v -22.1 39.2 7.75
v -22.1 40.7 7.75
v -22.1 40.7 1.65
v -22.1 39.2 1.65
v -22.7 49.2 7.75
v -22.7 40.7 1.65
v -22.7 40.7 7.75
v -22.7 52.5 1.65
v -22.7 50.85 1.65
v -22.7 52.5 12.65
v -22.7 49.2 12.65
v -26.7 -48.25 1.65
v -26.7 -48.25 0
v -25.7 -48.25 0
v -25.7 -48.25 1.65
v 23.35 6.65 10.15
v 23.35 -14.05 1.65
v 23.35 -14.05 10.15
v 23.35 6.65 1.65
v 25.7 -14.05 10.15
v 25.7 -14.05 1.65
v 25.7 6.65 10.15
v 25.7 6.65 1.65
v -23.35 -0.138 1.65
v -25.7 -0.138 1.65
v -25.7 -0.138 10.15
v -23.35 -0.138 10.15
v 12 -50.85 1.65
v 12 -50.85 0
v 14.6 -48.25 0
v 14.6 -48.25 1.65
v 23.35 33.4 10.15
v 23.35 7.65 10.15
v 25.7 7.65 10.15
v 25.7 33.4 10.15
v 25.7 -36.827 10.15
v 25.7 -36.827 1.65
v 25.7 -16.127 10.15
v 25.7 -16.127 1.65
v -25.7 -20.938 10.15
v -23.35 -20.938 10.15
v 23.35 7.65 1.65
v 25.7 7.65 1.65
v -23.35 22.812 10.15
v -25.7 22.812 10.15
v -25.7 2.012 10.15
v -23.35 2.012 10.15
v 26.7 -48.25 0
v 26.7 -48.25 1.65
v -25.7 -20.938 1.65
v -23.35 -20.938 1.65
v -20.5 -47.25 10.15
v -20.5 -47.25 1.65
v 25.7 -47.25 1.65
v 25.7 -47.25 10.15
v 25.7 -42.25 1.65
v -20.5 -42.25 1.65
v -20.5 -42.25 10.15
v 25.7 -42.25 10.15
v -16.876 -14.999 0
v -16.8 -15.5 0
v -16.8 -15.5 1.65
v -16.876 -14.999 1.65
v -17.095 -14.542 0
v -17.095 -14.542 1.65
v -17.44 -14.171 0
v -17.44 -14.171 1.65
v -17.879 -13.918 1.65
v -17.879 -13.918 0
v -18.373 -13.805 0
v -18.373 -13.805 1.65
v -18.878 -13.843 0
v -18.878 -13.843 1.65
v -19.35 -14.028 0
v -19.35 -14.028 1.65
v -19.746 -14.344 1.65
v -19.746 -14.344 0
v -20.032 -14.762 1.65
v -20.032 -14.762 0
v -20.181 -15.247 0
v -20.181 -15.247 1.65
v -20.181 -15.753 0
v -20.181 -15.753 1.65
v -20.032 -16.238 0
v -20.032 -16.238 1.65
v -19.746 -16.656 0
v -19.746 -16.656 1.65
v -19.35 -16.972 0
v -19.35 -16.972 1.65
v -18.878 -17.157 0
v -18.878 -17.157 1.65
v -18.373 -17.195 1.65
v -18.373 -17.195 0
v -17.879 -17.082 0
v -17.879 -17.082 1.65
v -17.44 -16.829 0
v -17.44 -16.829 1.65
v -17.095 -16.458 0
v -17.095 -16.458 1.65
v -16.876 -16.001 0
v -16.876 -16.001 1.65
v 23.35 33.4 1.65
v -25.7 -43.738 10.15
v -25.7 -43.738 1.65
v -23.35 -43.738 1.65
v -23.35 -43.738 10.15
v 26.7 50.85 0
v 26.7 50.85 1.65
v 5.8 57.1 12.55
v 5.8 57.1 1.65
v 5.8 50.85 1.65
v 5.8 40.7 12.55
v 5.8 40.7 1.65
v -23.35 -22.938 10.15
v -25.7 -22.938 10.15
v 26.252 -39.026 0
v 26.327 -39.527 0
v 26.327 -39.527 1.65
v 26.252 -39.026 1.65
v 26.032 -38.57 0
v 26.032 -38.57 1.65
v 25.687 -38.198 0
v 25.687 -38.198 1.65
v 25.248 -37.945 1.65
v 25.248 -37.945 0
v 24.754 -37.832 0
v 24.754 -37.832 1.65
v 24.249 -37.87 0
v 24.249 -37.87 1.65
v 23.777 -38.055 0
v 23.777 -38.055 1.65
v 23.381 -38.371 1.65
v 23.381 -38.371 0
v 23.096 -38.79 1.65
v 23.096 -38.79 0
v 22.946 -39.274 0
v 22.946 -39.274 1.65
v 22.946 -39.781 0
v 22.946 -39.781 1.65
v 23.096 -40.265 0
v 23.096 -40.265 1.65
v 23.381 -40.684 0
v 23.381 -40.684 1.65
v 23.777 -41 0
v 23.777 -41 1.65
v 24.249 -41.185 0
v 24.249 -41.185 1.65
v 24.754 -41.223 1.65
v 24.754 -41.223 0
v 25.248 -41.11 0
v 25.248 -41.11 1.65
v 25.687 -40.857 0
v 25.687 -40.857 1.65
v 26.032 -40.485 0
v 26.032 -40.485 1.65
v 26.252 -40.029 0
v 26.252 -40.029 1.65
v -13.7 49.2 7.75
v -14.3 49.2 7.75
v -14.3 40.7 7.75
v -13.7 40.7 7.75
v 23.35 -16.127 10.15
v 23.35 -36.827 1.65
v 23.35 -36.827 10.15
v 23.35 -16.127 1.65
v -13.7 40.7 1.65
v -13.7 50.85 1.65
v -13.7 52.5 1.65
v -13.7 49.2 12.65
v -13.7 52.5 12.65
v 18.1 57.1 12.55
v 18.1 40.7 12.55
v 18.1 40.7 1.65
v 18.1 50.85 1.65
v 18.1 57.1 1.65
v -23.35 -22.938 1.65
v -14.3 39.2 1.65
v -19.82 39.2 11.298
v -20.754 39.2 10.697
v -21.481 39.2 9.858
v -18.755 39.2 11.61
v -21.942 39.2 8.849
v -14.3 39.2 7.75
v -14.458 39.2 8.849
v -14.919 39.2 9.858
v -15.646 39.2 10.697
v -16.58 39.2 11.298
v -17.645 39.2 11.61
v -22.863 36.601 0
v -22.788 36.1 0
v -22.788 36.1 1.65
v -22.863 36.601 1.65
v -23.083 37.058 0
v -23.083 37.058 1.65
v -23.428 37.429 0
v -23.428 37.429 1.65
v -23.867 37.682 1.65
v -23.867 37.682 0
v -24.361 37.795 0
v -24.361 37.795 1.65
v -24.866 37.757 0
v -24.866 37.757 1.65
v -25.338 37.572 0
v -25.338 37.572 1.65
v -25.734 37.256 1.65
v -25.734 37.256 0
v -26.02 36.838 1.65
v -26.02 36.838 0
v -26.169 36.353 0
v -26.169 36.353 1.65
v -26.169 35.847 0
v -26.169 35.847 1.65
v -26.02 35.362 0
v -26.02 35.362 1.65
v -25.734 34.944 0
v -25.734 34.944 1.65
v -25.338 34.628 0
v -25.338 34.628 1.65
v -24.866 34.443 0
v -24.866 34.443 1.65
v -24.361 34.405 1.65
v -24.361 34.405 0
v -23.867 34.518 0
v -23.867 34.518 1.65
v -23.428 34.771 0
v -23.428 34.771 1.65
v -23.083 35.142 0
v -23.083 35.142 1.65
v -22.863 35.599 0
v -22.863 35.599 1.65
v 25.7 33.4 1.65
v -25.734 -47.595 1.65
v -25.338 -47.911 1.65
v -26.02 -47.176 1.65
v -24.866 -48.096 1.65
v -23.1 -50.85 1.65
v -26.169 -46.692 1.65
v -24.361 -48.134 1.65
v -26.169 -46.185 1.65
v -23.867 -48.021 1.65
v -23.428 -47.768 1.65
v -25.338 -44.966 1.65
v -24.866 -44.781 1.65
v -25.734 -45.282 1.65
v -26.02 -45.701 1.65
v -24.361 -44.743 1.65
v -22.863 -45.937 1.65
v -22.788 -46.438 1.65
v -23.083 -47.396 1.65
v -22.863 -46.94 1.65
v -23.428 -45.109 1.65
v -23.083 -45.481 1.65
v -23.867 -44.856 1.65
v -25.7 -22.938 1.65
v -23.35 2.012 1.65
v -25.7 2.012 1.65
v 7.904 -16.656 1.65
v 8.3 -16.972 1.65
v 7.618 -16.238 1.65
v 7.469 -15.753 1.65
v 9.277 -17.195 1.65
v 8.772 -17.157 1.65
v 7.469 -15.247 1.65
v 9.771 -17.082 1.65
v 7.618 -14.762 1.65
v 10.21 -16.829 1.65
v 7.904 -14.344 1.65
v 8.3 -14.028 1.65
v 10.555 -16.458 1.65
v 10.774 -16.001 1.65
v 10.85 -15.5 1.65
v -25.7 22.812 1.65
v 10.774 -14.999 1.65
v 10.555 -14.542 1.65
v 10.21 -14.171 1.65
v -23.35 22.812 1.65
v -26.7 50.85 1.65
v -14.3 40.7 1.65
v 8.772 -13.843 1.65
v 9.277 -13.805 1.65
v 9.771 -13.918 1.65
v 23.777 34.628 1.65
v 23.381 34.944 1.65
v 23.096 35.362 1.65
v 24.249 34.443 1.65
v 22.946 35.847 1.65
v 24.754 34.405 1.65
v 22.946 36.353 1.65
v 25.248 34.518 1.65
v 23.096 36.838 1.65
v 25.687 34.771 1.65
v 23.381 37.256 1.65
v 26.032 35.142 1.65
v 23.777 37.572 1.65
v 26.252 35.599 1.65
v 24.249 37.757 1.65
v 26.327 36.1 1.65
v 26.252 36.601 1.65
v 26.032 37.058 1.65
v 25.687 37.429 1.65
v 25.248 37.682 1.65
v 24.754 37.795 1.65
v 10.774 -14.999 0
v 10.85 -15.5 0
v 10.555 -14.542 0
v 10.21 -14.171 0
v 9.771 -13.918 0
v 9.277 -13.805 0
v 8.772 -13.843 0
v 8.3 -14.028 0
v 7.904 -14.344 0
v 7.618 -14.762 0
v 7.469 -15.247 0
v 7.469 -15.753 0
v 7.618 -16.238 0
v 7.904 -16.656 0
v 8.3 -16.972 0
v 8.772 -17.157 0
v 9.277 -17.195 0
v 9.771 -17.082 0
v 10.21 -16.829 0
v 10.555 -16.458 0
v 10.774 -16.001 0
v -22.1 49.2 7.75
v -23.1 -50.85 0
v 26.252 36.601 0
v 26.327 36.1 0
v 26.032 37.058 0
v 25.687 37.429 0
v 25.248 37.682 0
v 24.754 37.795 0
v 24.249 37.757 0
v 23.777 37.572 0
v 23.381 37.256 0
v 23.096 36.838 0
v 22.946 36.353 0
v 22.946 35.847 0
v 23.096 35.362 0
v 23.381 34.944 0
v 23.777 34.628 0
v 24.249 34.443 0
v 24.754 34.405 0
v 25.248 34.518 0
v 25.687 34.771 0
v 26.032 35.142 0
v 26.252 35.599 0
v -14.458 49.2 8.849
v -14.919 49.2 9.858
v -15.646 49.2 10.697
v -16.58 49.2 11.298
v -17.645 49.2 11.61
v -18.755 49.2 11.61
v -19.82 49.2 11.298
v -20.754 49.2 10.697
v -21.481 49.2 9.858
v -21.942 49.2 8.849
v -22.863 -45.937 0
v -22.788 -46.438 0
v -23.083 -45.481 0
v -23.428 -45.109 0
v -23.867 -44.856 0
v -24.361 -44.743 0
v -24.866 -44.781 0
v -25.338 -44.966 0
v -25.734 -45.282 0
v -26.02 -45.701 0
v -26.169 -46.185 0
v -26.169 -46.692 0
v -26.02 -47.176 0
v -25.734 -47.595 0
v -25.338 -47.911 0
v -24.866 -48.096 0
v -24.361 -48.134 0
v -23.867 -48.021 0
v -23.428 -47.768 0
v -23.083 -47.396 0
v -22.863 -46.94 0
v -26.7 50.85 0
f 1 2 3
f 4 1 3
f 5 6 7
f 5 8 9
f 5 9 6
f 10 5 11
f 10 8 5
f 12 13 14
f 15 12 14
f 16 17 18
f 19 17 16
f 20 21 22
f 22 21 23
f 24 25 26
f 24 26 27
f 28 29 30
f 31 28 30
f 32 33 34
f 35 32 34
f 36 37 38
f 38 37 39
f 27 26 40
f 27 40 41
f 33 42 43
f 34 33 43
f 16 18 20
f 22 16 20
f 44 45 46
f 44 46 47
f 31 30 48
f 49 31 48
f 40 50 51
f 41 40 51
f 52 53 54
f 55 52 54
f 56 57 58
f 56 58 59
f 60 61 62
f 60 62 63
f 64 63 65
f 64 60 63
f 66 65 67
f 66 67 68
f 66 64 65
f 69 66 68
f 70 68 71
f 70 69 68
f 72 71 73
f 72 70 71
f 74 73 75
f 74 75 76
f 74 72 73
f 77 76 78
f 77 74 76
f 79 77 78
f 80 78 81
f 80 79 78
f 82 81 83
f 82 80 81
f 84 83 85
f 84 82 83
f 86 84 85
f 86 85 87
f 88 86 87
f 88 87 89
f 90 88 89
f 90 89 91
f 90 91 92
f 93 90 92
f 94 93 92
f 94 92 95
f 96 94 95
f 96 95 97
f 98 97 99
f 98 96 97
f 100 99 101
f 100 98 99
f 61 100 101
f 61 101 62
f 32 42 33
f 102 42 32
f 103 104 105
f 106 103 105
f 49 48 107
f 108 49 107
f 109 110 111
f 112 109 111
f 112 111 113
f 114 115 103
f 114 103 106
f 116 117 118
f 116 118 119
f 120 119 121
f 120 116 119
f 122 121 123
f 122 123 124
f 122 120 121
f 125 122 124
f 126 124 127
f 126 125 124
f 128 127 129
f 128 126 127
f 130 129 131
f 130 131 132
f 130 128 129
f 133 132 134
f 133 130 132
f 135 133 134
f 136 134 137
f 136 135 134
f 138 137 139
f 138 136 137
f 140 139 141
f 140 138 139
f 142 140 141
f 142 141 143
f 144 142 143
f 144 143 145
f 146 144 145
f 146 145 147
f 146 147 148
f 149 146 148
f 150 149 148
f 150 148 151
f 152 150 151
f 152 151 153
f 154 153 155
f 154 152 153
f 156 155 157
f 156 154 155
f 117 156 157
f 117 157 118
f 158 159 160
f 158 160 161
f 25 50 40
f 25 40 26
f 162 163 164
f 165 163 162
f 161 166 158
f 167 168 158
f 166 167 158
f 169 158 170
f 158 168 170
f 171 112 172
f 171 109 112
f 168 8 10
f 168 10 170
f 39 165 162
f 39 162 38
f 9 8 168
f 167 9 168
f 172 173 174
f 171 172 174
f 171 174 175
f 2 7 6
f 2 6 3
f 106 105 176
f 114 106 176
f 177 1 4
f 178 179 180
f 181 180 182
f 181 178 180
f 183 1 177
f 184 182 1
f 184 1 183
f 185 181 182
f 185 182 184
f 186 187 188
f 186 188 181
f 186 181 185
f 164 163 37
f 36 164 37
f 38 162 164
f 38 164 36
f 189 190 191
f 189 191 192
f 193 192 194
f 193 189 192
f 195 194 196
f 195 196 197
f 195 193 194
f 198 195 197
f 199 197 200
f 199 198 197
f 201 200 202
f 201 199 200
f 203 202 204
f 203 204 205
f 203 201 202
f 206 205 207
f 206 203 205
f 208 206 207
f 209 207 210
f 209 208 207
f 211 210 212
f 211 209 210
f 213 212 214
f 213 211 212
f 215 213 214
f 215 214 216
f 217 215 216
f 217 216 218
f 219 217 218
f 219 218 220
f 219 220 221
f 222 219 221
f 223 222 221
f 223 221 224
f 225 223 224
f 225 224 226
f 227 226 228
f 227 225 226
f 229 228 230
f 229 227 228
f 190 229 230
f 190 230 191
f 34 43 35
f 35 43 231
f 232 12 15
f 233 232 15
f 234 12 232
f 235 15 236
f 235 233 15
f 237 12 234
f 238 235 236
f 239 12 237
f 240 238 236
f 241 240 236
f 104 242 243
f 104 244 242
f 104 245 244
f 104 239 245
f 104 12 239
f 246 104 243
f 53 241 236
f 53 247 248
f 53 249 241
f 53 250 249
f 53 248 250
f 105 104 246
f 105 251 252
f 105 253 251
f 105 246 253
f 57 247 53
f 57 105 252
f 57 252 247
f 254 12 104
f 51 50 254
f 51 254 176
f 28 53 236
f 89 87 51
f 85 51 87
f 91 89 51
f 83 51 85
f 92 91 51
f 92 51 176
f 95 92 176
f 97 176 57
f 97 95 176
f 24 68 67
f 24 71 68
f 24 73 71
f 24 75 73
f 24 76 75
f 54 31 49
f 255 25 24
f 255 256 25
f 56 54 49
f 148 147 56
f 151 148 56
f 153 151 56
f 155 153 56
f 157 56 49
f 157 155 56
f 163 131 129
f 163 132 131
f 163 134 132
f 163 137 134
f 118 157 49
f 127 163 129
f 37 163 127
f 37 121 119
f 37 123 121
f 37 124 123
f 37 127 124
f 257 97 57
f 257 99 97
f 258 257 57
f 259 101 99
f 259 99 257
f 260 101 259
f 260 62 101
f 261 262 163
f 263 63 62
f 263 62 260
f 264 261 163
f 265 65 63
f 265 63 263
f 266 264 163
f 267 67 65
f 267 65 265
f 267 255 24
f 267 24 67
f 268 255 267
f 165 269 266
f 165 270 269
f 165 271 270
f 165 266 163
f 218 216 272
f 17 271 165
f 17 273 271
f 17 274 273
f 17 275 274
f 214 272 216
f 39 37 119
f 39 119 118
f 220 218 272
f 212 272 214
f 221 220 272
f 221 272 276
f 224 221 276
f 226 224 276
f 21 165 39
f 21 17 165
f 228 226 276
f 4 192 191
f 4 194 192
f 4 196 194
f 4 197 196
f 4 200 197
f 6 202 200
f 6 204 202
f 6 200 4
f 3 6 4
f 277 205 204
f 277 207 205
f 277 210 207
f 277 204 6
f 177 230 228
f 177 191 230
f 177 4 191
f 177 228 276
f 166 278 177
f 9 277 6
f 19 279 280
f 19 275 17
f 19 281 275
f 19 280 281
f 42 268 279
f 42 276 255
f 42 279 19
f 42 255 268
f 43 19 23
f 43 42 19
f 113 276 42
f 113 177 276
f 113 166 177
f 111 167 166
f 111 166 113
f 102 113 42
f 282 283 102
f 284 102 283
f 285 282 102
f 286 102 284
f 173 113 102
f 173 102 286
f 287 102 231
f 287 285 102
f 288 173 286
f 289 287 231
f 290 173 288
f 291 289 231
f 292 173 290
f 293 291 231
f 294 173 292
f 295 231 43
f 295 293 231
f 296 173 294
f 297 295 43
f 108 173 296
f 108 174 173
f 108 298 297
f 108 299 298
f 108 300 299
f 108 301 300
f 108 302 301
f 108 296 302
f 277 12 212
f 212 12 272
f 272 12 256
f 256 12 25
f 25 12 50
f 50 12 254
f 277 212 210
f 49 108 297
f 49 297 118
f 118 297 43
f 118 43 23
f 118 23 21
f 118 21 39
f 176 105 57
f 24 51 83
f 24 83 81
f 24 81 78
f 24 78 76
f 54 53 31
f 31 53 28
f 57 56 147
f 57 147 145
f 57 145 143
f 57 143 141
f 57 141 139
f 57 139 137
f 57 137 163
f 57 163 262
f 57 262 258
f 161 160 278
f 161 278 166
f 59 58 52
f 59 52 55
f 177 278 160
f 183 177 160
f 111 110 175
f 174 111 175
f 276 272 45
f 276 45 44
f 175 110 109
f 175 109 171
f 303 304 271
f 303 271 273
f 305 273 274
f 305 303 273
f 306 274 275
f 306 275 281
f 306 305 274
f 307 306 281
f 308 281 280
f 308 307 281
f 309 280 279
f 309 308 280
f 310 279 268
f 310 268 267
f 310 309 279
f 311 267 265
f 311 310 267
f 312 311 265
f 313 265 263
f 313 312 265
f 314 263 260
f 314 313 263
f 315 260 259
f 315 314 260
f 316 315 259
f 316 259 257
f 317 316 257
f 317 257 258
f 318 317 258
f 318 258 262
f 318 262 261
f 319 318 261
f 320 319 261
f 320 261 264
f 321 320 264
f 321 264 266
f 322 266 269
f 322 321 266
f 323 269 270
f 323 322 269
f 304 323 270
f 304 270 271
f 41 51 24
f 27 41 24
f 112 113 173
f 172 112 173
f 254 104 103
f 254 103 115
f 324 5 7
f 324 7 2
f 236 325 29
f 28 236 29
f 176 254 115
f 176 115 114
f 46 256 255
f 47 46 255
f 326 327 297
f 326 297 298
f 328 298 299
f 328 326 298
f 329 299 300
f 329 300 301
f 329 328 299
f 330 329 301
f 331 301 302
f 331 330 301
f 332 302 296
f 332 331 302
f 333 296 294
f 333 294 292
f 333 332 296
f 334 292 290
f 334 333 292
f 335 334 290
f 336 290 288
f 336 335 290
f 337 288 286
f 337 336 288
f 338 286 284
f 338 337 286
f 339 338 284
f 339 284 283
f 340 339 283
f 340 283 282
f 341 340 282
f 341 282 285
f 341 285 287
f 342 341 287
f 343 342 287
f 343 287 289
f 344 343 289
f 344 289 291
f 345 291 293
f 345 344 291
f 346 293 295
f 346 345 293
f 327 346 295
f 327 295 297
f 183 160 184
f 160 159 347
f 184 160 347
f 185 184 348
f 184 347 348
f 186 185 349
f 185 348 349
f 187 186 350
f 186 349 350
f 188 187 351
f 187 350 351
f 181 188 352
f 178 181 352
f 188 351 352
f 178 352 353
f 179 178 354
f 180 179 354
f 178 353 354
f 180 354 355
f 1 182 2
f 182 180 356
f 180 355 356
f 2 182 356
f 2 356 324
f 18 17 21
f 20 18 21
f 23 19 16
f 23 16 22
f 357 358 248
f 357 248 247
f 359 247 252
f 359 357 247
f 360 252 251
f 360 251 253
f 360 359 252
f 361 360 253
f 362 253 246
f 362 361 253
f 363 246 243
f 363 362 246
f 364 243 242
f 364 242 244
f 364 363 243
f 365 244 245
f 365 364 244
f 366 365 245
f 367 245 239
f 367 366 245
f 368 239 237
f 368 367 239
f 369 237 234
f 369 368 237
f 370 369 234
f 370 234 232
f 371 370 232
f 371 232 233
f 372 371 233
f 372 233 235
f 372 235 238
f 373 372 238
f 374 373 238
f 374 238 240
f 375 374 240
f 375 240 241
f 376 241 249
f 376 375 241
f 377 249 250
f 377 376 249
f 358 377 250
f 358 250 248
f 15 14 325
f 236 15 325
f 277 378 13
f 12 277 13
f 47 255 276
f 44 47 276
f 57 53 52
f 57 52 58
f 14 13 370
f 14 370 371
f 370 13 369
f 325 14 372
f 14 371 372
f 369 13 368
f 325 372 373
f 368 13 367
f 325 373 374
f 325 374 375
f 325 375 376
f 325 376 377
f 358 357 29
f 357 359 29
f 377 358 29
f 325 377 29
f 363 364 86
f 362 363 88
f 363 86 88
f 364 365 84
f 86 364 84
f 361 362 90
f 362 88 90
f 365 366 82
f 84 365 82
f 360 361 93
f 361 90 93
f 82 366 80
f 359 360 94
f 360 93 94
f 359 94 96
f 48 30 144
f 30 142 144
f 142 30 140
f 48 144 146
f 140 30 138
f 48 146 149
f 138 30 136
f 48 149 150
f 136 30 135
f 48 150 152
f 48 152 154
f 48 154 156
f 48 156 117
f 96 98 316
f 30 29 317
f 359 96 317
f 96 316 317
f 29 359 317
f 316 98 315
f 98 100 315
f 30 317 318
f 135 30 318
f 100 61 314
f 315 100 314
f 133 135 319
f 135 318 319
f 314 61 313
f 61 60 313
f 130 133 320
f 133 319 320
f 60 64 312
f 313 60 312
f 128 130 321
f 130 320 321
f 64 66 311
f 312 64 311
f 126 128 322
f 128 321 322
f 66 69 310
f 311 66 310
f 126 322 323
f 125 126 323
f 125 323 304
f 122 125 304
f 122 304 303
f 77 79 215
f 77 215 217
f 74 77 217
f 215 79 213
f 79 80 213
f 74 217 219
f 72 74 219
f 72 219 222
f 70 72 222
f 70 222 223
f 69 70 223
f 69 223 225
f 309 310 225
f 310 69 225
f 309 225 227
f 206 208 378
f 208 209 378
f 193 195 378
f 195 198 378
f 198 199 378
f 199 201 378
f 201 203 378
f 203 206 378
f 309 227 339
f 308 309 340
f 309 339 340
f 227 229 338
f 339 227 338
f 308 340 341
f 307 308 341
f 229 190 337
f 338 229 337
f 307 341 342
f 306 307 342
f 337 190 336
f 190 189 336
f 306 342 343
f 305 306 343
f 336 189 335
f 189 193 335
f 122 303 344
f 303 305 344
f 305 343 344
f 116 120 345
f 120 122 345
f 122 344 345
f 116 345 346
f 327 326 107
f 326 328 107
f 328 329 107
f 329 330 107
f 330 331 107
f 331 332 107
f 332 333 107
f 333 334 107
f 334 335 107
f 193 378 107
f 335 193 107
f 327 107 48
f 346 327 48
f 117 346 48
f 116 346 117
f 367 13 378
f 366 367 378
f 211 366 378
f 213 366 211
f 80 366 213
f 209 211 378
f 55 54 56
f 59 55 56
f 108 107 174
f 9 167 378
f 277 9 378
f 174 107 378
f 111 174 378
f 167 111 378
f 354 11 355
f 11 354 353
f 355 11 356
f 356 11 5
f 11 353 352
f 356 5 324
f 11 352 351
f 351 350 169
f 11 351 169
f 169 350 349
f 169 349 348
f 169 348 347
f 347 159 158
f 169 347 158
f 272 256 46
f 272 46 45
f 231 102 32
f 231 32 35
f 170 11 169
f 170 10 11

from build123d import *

# Parameters (mm, degrees)
F0_R      = 1.7
F1_DEPTH  = 1.65
F2_W      = 9
F2_H      = 1.65
F3_DEPTH  = 11
F5_DEPTH  = 10
F6_W      = 0.6
F6_H      = 6.1
F7_DEPTH  = 8.5
F8_W      = 12.3
F8_H      = 10.15
F8_H_2    = 6.25
F9_DEPTH  = 10.9
F10_W     = 2.35
F10_H     = 25.75
F10_H_2   = 20.7
F10_W_2   = 46.2
F10_H_3   = 5
F10_H_4   = 20.8
F11_DEPTH = 8.5


with BuildPart() as f1:
    # F0 (on Top) → F1 (new body)
    with BuildSketch(Plane.XY):
        Polygon((-26.7, -48.25), (-25.7, -48.25), (14.6, -48.25), (26.7, -48.25), (26.7, 50.85), (-26.7, 50.85), align=None)
        with Locations((-24.4879107922, -46.4384518564)):
            Circle(F0_R, mode=Mode.SUBTRACT)
        with Locations((-18.5, -15.5)):
            Circle(F0_R, mode=Mode.SUBTRACT)
        with Locations((24.6273092926, -39.5274497569)):
            Circle(F0_R, mode=Mode.SUBTRACT)
        with Locations((9.15, -15.5)):
            Circle(F0_R, mode=Mode.SUBTRACT)
        with Locations((-24.4879107922, 36.1)):
            Circle(F0_R, mode=Mode.SUBTRACT)
        with Locations((24.6273092926, 36.1)):
            Circle(F0_R, mode=Mode.SUBTRACT)
        Polygon((-25.7, -48.25), (-23.1, -50.85), (12, -50.85), (14.6, -48.25), align=None)
    extrude(amount=F1_DEPTH)

    # F2 (on face) → F3 (join)
    with BuildSketch(Plane.XY.offset(1.65)):
        with Locations((-18.2, 50.025)):
            Rectangle(F2_W, F2_H)
        with Locations((-18.2, 51.675)):
            Rectangle(F2_W, F2_H)
    extrude(amount=F3_DEPTH)

    # F4 (on face) → F5 (join)
    with BuildSketch(Plane.XZ.offset(-49.2)):
        with BuildLine():
            Line((-14.3, 1.65), (-14.3, 7.75))
            ThreePointArc((-14.3, 7.75), (-18.2, 11.65), (-22.1, 7.75))
            Line((-22.1, 7.75), (-22.1, 1.65))
            Line((-22.1, 1.65), (-14.3, 1.65))
        make_face()
    extrude(amount=F5_DEPTH)

    # F6 (on face) → F7 (join)
    with BuildSketch(Plane.XZ.offset(-49.2)):
        with Locations((-22.4, 4.7)):
            Rectangle(F6_W, F6_H)
        with Locations((-14, 4.7)):
            Rectangle(F6_W, F6_H)
    extrude(amount=F7_DEPTH)

    # F8 (on face) → F9 (join)
    with BuildSketch(Plane.XY.offset(1.65)):
        with Locations((11.95, 45.775)):
            Rectangle(F8_W, F8_H)
        with Locations((11.95, 53.975)):
            Rectangle(F8_W, F8_H_2)
    extrude(amount=F9_DEPTH)

    # F10 (on face) → F11 (join)
    with BuildSketch(Plane.XY.offset(1.65)):
        with Locations((24.525, 20.525)):
            Rectangle(F10_W, F10_H)
        with Locations((24.525, -3.7)):
            Rectangle(F10_W, F10_H_2)
        with Locations((24.525, -26.4774497569)):
            Rectangle(F10_W, F10_H_2)
        with Locations((2.6, -44.75)):
            Rectangle(F10_W_2, F10_H_3)
        with Locations((-24.525, -33.3384518564)):
            Rectangle(F10_W, F10_H_4)
        with Locations((-24.525, -10.5384518564)):
            Rectangle(F10_W, F10_H_4)
        with Locations((-24.525, 12.4115481436)):
            Rectangle(F10_W, F10_H_4)
    extrude(amount=F11_DEPTH)


solid = f1.part
